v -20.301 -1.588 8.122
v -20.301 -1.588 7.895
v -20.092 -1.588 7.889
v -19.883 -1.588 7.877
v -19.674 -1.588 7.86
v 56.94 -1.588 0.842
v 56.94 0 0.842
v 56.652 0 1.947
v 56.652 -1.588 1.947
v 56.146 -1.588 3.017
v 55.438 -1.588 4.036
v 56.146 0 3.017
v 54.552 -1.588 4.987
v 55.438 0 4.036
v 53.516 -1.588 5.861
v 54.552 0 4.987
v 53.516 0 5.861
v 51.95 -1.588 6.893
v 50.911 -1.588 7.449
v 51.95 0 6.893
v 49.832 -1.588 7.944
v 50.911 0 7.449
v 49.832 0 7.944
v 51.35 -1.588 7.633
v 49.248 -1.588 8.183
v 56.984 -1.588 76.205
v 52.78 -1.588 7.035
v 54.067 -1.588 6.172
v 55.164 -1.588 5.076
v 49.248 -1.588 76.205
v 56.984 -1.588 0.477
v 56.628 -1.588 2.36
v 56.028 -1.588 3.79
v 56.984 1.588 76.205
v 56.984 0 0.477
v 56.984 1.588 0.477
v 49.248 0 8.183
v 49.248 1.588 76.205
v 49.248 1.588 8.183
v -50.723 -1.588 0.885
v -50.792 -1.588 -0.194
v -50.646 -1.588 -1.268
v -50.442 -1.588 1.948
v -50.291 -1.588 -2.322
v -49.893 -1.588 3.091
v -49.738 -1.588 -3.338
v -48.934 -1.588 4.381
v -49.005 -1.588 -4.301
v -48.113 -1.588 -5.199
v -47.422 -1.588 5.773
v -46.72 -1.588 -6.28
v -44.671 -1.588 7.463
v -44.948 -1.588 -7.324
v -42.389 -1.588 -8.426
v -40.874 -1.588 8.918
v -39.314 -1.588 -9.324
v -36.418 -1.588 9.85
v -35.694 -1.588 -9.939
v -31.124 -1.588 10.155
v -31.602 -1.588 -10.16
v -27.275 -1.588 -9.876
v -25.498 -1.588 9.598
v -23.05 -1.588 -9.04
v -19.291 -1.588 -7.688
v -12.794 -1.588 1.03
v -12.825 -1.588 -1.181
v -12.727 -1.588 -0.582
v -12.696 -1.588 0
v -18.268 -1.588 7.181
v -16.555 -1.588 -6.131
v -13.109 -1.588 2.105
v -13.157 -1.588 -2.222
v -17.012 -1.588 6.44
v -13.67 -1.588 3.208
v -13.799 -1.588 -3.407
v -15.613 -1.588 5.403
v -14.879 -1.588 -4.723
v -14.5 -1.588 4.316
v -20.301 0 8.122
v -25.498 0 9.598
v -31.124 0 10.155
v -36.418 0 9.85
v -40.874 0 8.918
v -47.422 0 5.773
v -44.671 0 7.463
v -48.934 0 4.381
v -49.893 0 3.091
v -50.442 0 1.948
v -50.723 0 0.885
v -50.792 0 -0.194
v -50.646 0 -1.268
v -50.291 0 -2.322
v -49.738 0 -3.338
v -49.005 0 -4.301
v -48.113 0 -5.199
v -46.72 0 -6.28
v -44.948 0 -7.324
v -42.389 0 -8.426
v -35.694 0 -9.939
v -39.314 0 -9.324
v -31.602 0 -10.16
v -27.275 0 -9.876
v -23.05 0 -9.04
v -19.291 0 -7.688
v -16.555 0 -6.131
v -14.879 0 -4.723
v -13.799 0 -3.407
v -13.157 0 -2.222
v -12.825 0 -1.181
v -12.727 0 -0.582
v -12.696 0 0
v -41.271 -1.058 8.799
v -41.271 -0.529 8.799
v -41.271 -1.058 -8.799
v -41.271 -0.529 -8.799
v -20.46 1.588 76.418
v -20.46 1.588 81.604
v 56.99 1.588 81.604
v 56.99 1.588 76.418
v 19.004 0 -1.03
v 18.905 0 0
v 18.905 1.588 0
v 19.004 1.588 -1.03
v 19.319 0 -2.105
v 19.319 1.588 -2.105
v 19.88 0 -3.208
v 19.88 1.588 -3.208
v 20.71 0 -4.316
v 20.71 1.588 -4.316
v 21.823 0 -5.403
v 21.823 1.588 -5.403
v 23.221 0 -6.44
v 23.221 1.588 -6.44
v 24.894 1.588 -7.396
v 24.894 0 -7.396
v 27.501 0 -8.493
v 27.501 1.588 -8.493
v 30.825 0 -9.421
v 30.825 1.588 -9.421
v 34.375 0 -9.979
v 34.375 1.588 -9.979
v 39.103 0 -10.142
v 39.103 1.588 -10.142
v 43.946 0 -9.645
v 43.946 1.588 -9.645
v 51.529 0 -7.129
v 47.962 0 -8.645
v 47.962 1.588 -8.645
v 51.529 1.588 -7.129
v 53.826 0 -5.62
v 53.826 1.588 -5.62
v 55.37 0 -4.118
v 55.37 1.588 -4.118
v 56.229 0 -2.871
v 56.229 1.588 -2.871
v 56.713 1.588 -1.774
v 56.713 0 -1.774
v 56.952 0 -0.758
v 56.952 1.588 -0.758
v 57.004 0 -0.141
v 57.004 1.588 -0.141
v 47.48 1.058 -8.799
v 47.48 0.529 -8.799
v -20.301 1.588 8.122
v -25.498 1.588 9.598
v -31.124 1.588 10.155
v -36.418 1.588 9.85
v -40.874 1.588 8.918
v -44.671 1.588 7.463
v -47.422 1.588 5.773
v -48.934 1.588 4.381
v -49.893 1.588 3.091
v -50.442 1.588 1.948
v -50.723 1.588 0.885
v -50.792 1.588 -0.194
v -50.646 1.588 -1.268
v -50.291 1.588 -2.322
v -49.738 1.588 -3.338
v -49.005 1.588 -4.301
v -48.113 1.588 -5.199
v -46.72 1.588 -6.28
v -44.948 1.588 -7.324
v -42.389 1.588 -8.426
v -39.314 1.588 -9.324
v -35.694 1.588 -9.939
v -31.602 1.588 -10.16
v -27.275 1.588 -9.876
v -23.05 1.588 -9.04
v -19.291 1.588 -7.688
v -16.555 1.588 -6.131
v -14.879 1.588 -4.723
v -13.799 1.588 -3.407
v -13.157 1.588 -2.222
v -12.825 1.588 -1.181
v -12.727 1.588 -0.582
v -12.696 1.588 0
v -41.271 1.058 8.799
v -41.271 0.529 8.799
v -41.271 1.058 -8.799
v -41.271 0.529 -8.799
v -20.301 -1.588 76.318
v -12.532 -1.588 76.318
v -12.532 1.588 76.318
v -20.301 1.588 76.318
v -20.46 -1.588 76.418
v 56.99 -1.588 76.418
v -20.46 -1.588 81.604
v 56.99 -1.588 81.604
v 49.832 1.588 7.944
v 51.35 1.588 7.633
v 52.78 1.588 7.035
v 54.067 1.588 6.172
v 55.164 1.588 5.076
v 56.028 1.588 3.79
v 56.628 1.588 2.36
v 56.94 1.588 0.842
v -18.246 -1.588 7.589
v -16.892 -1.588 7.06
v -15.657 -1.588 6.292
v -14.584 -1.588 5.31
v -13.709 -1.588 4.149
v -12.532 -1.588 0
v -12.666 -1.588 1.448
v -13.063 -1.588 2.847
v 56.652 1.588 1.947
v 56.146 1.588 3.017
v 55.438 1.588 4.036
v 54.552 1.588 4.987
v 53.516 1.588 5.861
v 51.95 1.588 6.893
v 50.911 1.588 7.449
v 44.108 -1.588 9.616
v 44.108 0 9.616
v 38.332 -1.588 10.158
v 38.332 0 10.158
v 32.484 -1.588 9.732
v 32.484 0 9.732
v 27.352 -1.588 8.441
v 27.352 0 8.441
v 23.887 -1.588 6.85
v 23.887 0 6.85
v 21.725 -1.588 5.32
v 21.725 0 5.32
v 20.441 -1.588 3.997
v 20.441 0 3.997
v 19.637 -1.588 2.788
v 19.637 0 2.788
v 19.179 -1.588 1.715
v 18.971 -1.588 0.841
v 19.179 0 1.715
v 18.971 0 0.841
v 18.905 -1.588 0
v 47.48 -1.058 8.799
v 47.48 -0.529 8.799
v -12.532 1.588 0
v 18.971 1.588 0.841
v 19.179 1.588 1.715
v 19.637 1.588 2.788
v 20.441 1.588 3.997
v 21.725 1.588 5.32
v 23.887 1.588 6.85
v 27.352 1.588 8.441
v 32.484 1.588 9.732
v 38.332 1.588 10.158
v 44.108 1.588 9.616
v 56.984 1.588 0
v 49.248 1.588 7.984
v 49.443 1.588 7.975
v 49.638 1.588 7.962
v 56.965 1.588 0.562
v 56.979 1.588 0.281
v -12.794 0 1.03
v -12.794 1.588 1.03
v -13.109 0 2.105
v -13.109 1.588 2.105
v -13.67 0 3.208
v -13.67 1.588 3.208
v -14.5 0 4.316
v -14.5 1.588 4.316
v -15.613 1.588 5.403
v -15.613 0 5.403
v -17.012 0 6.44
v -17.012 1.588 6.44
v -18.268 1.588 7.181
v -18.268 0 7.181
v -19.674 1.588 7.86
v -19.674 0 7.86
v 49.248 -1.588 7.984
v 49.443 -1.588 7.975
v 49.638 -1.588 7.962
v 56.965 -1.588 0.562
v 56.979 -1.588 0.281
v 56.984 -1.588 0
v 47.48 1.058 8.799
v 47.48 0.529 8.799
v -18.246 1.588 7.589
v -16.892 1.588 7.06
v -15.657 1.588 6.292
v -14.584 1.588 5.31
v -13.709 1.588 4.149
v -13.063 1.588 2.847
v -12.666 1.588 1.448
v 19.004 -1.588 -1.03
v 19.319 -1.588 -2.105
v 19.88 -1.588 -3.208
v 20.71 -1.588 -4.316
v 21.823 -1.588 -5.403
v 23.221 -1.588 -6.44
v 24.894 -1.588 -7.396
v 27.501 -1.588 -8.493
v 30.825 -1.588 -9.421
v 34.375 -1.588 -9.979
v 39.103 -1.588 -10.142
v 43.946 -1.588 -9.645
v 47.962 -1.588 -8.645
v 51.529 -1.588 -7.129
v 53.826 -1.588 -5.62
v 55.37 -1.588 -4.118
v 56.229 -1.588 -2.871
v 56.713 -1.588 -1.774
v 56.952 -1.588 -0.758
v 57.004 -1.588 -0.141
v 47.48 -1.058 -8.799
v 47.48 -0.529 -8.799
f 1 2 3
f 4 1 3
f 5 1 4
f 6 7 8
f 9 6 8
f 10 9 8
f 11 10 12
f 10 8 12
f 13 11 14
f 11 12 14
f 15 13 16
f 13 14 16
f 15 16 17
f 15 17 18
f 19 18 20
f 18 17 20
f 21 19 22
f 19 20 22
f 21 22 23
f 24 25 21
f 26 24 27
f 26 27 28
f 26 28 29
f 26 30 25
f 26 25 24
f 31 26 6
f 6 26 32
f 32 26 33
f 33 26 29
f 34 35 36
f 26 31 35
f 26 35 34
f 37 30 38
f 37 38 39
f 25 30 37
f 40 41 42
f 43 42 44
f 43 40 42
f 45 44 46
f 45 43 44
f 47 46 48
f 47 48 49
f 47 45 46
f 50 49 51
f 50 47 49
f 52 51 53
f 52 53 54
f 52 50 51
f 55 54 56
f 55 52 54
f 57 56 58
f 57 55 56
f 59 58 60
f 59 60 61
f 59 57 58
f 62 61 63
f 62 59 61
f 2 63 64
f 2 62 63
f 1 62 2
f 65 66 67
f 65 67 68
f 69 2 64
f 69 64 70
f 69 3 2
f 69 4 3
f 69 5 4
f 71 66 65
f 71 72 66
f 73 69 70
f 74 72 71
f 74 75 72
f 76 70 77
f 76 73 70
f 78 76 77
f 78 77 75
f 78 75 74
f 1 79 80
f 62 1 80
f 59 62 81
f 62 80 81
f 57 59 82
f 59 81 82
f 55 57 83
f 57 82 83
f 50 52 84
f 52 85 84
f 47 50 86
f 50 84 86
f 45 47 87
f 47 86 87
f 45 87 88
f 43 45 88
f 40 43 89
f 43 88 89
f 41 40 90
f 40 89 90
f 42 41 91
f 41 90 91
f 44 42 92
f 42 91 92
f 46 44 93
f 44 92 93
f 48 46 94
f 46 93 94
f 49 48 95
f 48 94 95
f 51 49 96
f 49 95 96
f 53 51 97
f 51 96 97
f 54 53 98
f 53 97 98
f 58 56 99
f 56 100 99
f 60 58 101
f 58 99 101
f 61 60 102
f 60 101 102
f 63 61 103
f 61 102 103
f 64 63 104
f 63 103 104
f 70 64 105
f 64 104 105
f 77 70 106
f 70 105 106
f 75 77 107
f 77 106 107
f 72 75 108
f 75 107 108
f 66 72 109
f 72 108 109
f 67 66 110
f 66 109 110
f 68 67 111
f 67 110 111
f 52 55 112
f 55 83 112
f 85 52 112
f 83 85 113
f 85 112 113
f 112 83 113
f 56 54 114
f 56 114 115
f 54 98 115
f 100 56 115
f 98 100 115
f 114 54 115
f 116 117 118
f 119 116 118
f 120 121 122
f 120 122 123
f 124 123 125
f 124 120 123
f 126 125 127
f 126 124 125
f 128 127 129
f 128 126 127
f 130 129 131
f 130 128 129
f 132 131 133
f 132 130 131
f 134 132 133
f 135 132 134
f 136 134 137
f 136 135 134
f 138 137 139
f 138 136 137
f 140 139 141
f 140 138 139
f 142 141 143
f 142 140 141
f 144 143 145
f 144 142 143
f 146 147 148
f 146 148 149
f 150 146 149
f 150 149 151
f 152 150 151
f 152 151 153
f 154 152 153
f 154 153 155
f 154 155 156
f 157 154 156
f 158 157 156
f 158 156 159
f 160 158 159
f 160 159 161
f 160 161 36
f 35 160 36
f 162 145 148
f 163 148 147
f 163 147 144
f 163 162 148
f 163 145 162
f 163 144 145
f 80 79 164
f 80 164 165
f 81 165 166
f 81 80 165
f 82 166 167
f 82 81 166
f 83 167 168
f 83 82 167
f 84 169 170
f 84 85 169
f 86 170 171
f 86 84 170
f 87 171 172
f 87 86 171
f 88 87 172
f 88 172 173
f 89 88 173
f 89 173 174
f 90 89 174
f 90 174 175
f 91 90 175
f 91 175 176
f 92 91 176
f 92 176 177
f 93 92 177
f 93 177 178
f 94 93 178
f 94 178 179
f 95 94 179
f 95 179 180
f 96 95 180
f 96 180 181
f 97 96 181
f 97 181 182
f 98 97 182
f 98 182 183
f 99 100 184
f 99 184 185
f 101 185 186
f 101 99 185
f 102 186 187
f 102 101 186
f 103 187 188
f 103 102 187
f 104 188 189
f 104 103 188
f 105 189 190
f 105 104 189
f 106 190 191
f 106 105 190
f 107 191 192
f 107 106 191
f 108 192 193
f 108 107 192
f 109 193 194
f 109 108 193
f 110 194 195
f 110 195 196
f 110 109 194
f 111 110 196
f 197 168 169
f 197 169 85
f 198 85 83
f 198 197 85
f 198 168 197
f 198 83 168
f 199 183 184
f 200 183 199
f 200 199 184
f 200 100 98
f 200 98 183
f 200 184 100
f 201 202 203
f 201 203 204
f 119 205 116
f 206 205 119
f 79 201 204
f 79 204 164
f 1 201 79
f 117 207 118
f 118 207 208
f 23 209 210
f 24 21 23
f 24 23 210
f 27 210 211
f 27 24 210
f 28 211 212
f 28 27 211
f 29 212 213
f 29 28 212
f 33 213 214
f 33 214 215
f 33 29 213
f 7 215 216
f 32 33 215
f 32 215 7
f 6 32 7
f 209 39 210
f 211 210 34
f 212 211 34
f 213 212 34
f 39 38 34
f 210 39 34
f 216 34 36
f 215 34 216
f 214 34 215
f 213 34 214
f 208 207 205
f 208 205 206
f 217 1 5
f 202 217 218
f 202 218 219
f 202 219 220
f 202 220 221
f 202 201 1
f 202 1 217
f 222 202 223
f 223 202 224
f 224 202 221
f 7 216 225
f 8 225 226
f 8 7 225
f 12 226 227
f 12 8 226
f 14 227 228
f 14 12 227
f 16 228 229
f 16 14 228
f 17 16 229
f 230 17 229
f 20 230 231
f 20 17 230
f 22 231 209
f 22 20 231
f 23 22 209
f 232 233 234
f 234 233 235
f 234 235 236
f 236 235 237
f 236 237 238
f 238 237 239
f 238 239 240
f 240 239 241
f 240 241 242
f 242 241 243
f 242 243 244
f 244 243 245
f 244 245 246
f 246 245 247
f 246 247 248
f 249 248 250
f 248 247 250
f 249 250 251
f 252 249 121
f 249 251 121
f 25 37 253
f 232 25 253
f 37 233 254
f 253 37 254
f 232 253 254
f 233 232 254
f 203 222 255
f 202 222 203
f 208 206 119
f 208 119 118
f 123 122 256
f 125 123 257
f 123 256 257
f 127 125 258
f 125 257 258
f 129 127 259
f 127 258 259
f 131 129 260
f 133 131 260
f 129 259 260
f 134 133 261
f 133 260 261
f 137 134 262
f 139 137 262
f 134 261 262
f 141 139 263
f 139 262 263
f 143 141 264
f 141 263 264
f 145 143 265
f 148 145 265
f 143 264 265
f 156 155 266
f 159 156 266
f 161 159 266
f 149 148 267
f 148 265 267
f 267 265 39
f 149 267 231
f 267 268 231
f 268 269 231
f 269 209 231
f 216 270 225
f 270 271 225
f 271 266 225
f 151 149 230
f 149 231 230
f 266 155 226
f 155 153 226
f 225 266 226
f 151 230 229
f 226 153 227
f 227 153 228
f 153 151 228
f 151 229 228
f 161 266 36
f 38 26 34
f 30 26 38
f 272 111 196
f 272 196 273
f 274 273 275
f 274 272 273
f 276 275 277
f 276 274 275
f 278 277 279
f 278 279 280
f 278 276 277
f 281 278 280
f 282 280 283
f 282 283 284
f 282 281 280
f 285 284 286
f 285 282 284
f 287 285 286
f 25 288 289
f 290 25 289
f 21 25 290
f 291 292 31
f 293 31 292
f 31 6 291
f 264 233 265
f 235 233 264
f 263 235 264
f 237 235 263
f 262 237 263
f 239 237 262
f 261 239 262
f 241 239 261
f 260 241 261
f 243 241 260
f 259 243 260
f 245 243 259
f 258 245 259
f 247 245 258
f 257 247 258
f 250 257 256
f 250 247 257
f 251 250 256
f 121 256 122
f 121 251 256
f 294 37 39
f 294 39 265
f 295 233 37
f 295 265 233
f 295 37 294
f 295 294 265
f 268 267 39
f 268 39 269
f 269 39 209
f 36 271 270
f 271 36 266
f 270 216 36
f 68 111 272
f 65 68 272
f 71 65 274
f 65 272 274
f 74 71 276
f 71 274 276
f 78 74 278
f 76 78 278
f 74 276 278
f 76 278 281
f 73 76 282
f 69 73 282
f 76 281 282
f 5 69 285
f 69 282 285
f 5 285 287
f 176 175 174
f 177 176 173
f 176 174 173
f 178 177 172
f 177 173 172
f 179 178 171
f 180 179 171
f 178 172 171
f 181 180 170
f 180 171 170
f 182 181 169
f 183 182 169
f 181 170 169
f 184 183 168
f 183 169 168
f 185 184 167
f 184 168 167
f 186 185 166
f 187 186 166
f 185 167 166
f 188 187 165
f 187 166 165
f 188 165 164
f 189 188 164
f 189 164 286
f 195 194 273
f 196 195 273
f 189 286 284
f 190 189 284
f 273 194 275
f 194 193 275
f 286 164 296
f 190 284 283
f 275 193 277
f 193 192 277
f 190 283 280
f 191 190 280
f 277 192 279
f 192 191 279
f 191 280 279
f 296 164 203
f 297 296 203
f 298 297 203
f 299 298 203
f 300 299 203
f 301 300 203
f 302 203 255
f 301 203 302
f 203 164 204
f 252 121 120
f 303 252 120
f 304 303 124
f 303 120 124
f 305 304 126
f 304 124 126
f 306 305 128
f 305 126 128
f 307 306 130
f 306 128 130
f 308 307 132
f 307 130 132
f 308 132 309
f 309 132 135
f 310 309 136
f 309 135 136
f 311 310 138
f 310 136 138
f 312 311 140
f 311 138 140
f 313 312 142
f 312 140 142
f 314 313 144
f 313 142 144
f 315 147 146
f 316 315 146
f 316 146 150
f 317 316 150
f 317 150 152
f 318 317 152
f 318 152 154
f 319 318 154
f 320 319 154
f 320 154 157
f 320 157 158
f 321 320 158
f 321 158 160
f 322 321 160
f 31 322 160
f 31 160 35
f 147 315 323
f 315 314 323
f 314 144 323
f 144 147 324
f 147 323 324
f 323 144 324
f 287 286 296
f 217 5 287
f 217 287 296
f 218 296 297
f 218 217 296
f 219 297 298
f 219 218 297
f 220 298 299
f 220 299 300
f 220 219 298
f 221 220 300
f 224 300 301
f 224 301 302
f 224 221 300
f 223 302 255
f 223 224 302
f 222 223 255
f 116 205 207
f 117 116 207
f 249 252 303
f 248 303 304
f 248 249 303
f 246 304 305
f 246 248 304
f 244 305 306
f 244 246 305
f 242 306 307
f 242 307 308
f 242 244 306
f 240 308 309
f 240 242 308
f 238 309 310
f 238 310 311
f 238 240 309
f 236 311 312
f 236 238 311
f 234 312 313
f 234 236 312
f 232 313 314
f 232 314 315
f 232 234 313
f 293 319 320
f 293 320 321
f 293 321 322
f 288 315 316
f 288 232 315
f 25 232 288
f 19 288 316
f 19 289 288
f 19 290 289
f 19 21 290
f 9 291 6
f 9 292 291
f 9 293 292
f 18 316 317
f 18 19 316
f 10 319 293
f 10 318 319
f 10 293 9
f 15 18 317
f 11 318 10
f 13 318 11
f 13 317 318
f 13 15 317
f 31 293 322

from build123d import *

# Parameters (mm, degrees)
F5_DEPTH = 1.5875
F6_DEPTH = 1.5875
F7_DEPTH = 1.5875
F8_DEPTH = 1.5875
F4_W     = 77.449792996
F4_H     = 5.1856189966
F9_DEPTH = 1.5875


with BuildPart() as f5:
    # F0 (on Front) → F5 (new body, symmetric)
    with BuildSketch(Plane.XZ):
        with BuildLine():
            add(Edge.make_bspline(
                [(-12.6955120239, 0), (-12.6955120239, 17.5976362049), (-41.2705120239, 8.7988181024), (-69.8455120239, 0), (-41.2705120239, -8.7988181024), (-12.6955120239, -17.5976362049), (-12.6955120239, 0)],
                knots=[0, 0, 0, 2.0943951024, 2.0943951024, 4.1887902048, 4.1887902048, 6.2831853072, 6.2831853072, 6.2831853072], degree=2, weights=[1, 0.5, 1, 0.5, 1, 0.5, 1]))
        make_face()
    extrude(amount=F5_DEPTH, both=True)

    # F2 (on Front) → F7 (join, symmetric)
    with BuildSketch(Plane.XZ):
        with BuildLine():
            ThreePointArc((-20.301355049, 7.8949732706), (-14.7998937299, 5.5384594896), (-12.5317005441, 0))
            Line((-12.5317005441, 0), (-12.5317005441, 76.3180702925))
            Line((-12.5317005441, 76.3180702925), (-20.301355049, 76.3180702925))
            Line((-20.301355049, 76.3180702925), (-20.301355049, 7.8949732706))
        make_face()
    extrude(amount=F7_DEPTH, both=True)


with BuildPart() as f6:
    # F1 (on Front) → F6 (new body, symmetric)
    with BuildSketch(Plane.XZ):
        with BuildLine():
            add(Edge.make_bspline(
                [(18.9053961899, 0), (18.9053961899, -17.5976362049), (47.4803961899, -8.7988181024), (76.0553961899, 0), (47.4803961899, 8.7988181024), (18.9053961899, 17.5976362049), (18.9053961899, 0)],
                knots=[0, 0, 0, 2.0943951024, 2.0943951024, 4.1887902048, 4.1887902048, 6.2831853072, 6.2831853072, 6.2831853072], degree=2, weights=[1, 0.5, 1, 0.5, 1, 0.5, 1]))
        make_face()
    extrude(amount=F6_DEPTH, both=True)

    # F3 (on Front) → F8 (join, symmetric)
    with BuildSketch(Plane.XZ):
        with BuildLine():
            ThreePointArc((49.2478497326, 7.9836277291), (54.7329249967, 5.5585913104), (56.9843500853, 0))
            Line((56.9843500853, 0), (56.9843500853, 76.2054771185))
            Line((56.9843500853, 76.2054771185), (49.2478497326, 76.2054771185))
            Line((49.2478497326, 76.2054771185), (49.2478497326, 7.9836277291))
        make_face()
    extrude(amount=F8_DEPTH, both=True)


with BuildPart() as f9:
    # F4 (on Front) → F9 (new body, symmetric)
    with BuildSketch(Plane.XZ):
        with Locations((18.2647733018, 79.0109410882)):
            Rectangle(F4_W, F4_H)
    extrude(amount=F9_DEPTH, both=True)


solid = Compound([f5.part, f6.part, f9.part])
